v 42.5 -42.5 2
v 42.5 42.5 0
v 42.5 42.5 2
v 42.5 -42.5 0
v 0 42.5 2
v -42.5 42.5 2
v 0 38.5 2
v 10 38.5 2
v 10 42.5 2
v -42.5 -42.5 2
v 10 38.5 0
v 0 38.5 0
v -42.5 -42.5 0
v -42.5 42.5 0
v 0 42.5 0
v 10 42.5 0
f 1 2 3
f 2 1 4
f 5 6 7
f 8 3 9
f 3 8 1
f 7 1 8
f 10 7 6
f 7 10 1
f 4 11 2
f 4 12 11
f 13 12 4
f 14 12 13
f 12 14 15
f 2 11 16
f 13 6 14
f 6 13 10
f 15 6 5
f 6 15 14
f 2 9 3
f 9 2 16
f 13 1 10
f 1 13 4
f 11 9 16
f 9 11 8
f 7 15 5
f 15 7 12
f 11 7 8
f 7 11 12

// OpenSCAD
// Sowing template for 90mm Petri dish - flat disc with grid holes and orientation notch.

// Dimensions
DISH_DIAMETER = 90;
DISC_DIAMETER = 85;
THICKNESS     = 2;
HOLE_COUNT    = 7;
HOLE_DIAMETER = 3;
HOLE_SPACING  = 9;
NOTCH_WIDTH   = 10;
NOTCH_DEPTH   = 4;

$fn = 128;

// Calculate grid positions centred on origin
// n features spaced p apart and centred on the origin sit at (i - (n - 1) / 2) * p
grid_offset = (HOLE_COUNT - 1) / 2 * HOLE_SPACING;

difference() {
    // Main disc body
    translate([-DISC_DIAMETER / 2, -DISC_DIAMETER / 2, 0])
        cube([DISC_DIAMETER, DISC_DIAMETER, THICKNESS]);

    // Grid of holes
    for (i = [0 : HOLE_COUNT - 1]) {
        x_pos = (i - grid_offset) * HOLE_SPACING;
        y_pos = (i - grid_offset) * HOLE_SPACING;
        
        // Cut hole extending slightly past the face to ensure clean cut
        translate([x_pos, y_pos, -1])
            cylinder(h = THICKNESS + 2, d = HOLE_DIAMETER);
    }

    // Orientation notch on the +Y side
    // Notch is 10mm wide (X) and 4mm deep (Y, measured in from the rim)
    // Rim Y position = DISC_DIAMETER / 2 = 42.5
    // Notch starts at Y = 42.5 - 4 = 38.5
    // Notch extends to Y = 42.5
    // Notch is centred on Y axis, so X range is [-5, 5]
    
    translate([0, DISC_DIAMETER / 2 - NOTCH_DEPTH, 0])
        cube([NOTCH_WIDTH, NOTCH_DEPTH, THICKNESS + 2]);
}
